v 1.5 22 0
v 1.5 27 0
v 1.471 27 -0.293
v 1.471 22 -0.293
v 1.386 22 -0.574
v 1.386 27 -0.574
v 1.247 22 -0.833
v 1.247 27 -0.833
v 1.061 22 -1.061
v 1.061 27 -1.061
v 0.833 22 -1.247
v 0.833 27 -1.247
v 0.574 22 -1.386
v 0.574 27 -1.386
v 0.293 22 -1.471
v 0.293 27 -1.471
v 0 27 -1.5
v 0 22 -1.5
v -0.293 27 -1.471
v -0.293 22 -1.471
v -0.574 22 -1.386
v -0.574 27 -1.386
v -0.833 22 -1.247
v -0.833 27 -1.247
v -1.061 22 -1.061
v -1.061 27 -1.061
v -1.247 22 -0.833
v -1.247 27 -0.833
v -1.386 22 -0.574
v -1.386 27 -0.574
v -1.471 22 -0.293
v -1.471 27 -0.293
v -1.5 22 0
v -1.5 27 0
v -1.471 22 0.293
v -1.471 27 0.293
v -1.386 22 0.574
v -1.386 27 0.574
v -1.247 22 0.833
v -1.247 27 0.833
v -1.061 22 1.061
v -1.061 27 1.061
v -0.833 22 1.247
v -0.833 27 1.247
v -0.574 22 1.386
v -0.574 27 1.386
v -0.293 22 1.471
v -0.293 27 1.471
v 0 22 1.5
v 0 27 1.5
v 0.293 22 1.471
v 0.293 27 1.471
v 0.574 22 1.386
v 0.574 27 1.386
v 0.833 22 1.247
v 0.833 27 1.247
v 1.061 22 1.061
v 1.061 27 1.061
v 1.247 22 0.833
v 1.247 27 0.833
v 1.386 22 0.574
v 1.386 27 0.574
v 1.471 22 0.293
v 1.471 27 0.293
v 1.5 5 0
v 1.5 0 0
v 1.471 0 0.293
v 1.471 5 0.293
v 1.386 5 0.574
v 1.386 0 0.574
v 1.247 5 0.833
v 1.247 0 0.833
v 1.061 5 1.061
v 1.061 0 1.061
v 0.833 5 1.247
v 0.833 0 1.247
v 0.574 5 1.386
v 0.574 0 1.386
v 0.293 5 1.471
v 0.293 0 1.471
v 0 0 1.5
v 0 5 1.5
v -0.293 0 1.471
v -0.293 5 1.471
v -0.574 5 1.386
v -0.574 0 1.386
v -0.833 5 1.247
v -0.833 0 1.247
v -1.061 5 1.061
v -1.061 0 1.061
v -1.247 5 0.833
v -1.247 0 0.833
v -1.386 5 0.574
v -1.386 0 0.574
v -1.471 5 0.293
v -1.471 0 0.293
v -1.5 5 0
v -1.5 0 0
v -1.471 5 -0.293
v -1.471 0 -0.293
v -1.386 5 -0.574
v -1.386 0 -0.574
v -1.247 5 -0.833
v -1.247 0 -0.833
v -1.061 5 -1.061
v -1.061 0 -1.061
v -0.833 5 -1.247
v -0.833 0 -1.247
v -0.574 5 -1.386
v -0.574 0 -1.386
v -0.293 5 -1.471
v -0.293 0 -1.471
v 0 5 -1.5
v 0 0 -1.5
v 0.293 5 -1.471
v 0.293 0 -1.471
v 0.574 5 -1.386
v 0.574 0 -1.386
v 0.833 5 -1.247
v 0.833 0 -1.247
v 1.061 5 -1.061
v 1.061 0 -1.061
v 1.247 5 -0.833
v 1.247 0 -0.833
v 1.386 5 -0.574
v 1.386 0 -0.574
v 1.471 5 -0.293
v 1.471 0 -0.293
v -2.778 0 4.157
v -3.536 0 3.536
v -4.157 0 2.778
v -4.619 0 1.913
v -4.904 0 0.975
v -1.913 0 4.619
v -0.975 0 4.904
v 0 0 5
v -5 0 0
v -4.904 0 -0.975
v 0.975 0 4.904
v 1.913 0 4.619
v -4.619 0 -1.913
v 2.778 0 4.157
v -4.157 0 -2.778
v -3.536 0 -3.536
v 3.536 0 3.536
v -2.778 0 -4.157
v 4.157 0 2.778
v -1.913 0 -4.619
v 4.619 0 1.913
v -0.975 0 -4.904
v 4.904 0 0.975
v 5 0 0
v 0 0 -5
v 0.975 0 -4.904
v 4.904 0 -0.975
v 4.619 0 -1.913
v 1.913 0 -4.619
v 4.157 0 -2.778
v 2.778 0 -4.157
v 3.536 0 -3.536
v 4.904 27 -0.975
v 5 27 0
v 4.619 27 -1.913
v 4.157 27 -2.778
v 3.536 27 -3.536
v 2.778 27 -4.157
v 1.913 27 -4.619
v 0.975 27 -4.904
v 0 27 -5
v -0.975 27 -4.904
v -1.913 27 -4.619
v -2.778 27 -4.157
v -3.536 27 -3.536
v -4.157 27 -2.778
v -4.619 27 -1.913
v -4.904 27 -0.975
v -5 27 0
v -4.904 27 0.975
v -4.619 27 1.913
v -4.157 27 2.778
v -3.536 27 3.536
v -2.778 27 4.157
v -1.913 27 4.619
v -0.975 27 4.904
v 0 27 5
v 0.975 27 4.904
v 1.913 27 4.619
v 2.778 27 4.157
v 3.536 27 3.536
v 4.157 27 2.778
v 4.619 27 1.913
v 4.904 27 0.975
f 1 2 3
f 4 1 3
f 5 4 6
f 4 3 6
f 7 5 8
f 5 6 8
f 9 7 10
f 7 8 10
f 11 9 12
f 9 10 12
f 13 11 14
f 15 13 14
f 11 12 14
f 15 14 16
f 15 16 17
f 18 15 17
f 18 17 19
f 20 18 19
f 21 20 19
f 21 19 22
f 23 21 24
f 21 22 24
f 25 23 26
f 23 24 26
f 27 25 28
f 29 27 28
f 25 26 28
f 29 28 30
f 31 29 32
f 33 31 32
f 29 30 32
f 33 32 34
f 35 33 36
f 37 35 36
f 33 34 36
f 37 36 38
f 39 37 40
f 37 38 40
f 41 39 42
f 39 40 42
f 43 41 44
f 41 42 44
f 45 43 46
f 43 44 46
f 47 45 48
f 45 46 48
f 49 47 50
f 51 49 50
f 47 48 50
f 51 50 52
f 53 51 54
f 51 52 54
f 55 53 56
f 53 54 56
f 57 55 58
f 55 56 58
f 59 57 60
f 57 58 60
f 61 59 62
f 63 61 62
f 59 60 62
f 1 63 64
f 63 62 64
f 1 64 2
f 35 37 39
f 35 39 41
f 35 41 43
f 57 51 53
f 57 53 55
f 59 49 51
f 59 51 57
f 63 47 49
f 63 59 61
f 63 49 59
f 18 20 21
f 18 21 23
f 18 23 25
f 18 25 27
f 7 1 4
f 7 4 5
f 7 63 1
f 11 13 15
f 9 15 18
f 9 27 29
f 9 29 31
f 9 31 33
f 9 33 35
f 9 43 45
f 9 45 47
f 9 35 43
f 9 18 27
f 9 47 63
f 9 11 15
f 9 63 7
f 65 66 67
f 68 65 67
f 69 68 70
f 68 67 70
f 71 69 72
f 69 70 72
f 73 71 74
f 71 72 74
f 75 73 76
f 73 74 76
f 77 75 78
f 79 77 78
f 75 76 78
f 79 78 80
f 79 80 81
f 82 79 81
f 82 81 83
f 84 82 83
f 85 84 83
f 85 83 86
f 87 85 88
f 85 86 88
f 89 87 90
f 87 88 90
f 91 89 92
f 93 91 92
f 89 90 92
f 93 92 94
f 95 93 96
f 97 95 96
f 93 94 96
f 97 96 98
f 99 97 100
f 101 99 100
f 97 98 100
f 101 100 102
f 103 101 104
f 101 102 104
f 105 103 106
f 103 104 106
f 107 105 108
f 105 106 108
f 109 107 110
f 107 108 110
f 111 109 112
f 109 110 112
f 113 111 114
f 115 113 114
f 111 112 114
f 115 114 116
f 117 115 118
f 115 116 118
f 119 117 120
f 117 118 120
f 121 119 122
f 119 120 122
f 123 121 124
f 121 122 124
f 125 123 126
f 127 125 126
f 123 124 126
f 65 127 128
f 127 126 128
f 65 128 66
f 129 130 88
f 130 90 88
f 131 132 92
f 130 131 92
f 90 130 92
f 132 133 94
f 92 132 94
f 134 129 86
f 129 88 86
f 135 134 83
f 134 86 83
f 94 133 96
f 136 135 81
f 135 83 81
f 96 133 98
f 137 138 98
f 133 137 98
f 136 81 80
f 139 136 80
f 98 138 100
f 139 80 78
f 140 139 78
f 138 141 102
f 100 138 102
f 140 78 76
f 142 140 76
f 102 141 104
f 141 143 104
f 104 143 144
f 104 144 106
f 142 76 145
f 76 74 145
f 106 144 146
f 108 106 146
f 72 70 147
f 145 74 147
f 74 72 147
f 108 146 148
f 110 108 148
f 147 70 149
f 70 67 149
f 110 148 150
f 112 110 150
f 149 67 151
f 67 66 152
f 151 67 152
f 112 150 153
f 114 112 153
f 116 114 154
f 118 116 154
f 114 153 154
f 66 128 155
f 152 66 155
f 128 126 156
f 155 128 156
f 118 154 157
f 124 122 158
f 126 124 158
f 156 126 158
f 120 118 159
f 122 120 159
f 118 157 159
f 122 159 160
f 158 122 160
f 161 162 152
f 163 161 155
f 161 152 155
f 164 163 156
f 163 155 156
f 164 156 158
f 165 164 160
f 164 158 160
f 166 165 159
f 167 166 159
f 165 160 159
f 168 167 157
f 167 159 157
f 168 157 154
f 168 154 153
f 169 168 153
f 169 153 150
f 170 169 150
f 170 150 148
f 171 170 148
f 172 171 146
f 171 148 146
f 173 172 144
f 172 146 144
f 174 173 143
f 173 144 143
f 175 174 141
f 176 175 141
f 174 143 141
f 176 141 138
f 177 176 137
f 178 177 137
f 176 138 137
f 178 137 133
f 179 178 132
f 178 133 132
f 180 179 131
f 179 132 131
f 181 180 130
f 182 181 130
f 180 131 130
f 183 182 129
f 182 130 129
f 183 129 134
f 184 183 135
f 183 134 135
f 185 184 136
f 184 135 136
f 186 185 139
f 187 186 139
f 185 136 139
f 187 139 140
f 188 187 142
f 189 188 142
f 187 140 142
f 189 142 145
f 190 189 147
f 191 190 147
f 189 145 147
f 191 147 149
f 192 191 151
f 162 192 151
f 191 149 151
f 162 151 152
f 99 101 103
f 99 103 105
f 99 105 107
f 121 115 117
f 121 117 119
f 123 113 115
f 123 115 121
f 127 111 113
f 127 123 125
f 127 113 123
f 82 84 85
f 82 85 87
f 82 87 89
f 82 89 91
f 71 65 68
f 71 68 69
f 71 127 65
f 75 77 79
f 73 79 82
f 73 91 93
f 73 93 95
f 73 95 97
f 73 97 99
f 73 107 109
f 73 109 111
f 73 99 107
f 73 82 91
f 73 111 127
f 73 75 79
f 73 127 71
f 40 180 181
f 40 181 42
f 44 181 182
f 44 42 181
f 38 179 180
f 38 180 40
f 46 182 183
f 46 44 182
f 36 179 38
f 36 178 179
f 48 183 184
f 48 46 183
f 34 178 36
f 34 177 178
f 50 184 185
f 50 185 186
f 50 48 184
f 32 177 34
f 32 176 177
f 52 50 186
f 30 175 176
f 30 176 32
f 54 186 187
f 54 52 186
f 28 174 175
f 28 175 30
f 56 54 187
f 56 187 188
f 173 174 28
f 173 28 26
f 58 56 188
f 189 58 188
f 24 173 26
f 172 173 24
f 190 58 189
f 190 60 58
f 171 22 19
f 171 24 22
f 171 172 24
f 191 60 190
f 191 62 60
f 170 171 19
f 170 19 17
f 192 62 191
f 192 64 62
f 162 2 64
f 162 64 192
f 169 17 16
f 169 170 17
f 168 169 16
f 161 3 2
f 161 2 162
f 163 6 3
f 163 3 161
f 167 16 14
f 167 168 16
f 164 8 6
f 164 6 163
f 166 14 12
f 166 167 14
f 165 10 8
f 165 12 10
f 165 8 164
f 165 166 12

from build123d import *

# Parameters (mm, degrees)
CROQUIS1_R              = 5
SALIENTE_EXTRUIR1_DEPTH = 27
CROQUIS2_R              = 1.5
CORTAR_EXTRUIR1_DEPTH   = 5
CROQUIS4_R              = 1.5
CORTAR_EXTRUIR2_DEPTH   = 5


with BuildPart() as part:
    # Croquis1 → Saliente-Extruir1 (new body)
    with BuildSketch(Plane(origin=(0, 0, 0), x_dir=(1, 0, 0), z_dir=(0, 1, 0))):
        Circle(CROQUIS1_R)
    extrude(amount=SALIENTE_EXTRUIR1_DEPTH)

    # Croquis2 → Cortar-Extruir1 (cut)
    with BuildSketch(Plane(origin=(0, 27, 0), x_dir=(1, 0, 0), z_dir=(0, 1, 0))):
        Circle(CROQUIS2_R)
    extrude(amount=-CORTAR_EXTRUIR1_DEPTH, mode=Mode.SUBTRACT)

    # Croquis4 → Cortar-Extruir2 (cut)
    with BuildSketch(Plane.XZ):
        Circle(CROQUIS4_R)
    extrude(amount=-CORTAR_EXTRUIR2_DEPTH, mode=Mode.SUBTRACT)


solid = part.part
